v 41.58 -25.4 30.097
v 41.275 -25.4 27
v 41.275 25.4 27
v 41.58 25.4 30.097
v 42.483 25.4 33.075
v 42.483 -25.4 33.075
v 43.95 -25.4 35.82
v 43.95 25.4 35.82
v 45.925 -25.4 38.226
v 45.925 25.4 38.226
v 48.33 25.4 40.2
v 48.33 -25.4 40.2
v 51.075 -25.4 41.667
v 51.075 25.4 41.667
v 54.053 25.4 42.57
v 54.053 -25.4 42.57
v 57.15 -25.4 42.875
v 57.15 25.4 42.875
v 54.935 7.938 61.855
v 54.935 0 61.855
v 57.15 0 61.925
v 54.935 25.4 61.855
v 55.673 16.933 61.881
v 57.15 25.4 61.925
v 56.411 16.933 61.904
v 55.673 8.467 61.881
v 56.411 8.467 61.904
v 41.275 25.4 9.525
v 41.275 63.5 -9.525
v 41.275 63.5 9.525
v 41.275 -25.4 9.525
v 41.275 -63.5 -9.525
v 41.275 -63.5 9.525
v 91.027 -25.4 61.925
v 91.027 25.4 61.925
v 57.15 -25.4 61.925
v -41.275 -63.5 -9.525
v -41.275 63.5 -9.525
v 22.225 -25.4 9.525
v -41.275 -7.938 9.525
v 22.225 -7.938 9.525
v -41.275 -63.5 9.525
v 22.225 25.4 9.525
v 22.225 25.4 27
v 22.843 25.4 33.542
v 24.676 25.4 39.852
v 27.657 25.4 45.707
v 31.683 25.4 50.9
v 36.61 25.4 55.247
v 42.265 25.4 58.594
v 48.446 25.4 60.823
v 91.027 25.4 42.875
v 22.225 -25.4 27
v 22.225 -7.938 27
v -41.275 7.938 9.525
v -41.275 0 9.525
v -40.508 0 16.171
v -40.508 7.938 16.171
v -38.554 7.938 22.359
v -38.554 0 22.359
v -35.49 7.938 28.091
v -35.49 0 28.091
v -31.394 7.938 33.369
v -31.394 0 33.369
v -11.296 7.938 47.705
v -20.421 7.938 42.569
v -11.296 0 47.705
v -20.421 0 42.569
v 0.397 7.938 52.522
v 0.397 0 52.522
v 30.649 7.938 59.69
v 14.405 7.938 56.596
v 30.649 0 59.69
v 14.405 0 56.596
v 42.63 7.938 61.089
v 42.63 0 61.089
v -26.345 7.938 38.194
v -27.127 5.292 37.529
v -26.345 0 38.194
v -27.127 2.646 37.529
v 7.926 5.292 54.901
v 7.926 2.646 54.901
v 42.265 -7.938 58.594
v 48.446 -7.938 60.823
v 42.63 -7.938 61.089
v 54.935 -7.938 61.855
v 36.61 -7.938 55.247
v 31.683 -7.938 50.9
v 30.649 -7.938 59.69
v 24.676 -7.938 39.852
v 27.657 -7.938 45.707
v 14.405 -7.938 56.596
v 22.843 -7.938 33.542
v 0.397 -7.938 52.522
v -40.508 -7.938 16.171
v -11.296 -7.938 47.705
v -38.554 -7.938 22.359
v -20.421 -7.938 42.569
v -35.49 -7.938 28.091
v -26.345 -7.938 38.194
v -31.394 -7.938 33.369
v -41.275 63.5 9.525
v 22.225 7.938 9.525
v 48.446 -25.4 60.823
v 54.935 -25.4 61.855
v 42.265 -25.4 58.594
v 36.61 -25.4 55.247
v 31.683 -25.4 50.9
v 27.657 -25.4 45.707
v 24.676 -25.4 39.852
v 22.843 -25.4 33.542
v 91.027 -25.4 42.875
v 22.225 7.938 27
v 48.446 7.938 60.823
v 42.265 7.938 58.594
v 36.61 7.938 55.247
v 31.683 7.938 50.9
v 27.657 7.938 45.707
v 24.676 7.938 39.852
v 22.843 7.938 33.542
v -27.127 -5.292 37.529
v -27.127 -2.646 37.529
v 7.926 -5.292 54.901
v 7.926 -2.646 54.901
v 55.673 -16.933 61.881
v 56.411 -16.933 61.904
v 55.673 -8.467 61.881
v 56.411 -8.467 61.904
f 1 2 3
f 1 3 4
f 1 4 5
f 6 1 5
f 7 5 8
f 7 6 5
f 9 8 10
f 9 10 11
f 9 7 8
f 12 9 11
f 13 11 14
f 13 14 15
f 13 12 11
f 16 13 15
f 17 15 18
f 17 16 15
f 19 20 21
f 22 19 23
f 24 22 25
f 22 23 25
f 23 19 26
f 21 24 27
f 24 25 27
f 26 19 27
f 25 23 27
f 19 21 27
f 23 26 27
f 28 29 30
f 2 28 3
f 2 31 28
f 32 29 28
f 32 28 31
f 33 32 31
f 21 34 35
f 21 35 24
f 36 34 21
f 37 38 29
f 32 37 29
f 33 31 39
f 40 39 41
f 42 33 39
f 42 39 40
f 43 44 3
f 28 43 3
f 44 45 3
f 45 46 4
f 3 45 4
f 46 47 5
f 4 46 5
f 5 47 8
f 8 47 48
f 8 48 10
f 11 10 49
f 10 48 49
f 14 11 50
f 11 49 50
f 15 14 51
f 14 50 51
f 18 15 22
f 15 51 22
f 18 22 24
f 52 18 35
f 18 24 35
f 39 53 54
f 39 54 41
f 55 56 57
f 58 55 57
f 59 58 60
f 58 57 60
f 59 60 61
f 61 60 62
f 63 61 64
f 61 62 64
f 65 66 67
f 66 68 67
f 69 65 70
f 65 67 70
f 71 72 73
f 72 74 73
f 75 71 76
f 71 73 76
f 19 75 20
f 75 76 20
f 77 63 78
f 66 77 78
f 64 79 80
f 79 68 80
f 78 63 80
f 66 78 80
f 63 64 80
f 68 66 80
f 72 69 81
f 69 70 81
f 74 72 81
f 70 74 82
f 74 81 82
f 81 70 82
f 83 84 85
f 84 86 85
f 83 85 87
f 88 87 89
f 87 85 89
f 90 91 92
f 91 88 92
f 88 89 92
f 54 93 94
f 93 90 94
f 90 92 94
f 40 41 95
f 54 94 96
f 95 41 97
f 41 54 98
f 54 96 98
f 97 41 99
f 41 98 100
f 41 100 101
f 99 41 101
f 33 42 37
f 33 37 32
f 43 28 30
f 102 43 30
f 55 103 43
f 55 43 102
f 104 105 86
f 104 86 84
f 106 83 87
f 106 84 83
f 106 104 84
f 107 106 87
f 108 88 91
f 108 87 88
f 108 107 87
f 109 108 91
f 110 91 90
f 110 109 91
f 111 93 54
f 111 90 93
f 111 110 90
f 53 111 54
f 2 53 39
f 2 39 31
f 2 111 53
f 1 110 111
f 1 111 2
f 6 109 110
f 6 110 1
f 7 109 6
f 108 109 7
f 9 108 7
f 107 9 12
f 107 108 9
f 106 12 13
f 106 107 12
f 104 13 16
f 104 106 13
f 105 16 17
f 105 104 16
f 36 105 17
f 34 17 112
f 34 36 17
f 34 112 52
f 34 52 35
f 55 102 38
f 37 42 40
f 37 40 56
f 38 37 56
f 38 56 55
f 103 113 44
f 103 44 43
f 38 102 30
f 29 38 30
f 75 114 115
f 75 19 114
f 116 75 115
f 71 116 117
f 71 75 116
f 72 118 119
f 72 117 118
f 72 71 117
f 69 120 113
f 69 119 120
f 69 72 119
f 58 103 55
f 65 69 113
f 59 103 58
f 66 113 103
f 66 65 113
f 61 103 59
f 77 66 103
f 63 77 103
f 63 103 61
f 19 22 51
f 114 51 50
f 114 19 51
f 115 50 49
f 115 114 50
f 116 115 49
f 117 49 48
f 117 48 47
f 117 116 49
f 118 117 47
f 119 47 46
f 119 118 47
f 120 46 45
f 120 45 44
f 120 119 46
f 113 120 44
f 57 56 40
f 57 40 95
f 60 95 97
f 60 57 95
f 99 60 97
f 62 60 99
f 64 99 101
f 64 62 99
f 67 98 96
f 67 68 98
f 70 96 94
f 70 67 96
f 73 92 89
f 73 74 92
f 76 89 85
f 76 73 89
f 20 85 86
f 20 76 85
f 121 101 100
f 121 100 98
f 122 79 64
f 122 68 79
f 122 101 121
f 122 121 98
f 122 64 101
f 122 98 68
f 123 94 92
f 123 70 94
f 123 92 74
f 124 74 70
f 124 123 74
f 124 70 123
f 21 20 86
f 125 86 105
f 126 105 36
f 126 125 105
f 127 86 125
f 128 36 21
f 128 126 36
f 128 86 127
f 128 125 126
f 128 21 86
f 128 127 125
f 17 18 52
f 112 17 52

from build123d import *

# Parameters (mm, degrees)
F1_DEPTH = 63.5
F0_W     = 30.702464082
F0_H     = 19.05
F2_DEPTH = 25.4
F3_DEPTH = 7.9375


with BuildPart() as f1:
    # F0 (on Front) → F1 (new body, symmetric)
    with BuildSketch(Plane.XZ):
        Polygon((22.225, 9.525), (-41.275, 9.525), (-41.275, -9.525), (41.275, -9.525), (41.275, 9.525), align=None)
    extrude(amount=F1_DEPTH, both=True)

    # F0 (on Front) → F2 (join, symmetric)
    with BuildSketch(Plane.XZ):
        with BuildLine():
            Line((22.225, 27.0002), (22.225, 9.525))
            Line((22.225, 9.525), (41.275, 9.525))
            Line((41.275, 9.525), (41.275, 27.0002))
            ThreePointArc((41.275, 27.0002), (45.9246798487, 38.2255201513), (57.15, 42.8752))
            Line((57.15, 42.8752), (60.325, 42.8752))
            Line((60.325, 42.8752), (60.325, 61.9252))
            Line((60.325, 61.9252), (57.15, 61.9252))
            add(Edge.make_bspline(
                [(54.9349397203, 61.8548859541), (55.6723551603, 61.8816525899), (56.410751637, 61.905089585), (57.15, 61.9252)],
                knots=[109.884057266, 109.884057266, 109.884057266, 109.884057266, 111.5045361635, 111.5045361635, 111.5045361635, 111.5045361635], degree=3))
            ThreePointArc((54.9349397203, 61.8548859541), (31.6831921389, 50.899934776), (22.225, 27.0002))
        make_face()
        with Locations((75.676232041, 52.4002)):
            Rectangle(F0_W, F0_H)
    extrude(amount=F2_DEPTH, both=True)

    # F0 (on Front) → F3 (join, symmetric)
    with BuildSketch(Plane.XZ):
        with BuildLine():
            add(Edge.make_bspline(
                [(-41.275, 9.525), (-40.5618331855, 42.9146462333), (4.9310793981, 60.0398505673), (54.9349397203, 61.8548859541)],
                knots=[0, 0, 0, 0, 109.884057266, 109.884057266, 109.884057266, 109.884057266], degree=3))
            Line((-41.275, 9.525), (22.225, 9.525))
            Line((22.225, 9.525), (22.225, 27.0002))
            ThreePointArc((22.225, 27.0002), (31.6831921389, 50.899934776), (54.9349397203, 61.8548859541))
        make_face()
    extrude(amount=F3_DEPTH, both=True)


solid = f1.part
